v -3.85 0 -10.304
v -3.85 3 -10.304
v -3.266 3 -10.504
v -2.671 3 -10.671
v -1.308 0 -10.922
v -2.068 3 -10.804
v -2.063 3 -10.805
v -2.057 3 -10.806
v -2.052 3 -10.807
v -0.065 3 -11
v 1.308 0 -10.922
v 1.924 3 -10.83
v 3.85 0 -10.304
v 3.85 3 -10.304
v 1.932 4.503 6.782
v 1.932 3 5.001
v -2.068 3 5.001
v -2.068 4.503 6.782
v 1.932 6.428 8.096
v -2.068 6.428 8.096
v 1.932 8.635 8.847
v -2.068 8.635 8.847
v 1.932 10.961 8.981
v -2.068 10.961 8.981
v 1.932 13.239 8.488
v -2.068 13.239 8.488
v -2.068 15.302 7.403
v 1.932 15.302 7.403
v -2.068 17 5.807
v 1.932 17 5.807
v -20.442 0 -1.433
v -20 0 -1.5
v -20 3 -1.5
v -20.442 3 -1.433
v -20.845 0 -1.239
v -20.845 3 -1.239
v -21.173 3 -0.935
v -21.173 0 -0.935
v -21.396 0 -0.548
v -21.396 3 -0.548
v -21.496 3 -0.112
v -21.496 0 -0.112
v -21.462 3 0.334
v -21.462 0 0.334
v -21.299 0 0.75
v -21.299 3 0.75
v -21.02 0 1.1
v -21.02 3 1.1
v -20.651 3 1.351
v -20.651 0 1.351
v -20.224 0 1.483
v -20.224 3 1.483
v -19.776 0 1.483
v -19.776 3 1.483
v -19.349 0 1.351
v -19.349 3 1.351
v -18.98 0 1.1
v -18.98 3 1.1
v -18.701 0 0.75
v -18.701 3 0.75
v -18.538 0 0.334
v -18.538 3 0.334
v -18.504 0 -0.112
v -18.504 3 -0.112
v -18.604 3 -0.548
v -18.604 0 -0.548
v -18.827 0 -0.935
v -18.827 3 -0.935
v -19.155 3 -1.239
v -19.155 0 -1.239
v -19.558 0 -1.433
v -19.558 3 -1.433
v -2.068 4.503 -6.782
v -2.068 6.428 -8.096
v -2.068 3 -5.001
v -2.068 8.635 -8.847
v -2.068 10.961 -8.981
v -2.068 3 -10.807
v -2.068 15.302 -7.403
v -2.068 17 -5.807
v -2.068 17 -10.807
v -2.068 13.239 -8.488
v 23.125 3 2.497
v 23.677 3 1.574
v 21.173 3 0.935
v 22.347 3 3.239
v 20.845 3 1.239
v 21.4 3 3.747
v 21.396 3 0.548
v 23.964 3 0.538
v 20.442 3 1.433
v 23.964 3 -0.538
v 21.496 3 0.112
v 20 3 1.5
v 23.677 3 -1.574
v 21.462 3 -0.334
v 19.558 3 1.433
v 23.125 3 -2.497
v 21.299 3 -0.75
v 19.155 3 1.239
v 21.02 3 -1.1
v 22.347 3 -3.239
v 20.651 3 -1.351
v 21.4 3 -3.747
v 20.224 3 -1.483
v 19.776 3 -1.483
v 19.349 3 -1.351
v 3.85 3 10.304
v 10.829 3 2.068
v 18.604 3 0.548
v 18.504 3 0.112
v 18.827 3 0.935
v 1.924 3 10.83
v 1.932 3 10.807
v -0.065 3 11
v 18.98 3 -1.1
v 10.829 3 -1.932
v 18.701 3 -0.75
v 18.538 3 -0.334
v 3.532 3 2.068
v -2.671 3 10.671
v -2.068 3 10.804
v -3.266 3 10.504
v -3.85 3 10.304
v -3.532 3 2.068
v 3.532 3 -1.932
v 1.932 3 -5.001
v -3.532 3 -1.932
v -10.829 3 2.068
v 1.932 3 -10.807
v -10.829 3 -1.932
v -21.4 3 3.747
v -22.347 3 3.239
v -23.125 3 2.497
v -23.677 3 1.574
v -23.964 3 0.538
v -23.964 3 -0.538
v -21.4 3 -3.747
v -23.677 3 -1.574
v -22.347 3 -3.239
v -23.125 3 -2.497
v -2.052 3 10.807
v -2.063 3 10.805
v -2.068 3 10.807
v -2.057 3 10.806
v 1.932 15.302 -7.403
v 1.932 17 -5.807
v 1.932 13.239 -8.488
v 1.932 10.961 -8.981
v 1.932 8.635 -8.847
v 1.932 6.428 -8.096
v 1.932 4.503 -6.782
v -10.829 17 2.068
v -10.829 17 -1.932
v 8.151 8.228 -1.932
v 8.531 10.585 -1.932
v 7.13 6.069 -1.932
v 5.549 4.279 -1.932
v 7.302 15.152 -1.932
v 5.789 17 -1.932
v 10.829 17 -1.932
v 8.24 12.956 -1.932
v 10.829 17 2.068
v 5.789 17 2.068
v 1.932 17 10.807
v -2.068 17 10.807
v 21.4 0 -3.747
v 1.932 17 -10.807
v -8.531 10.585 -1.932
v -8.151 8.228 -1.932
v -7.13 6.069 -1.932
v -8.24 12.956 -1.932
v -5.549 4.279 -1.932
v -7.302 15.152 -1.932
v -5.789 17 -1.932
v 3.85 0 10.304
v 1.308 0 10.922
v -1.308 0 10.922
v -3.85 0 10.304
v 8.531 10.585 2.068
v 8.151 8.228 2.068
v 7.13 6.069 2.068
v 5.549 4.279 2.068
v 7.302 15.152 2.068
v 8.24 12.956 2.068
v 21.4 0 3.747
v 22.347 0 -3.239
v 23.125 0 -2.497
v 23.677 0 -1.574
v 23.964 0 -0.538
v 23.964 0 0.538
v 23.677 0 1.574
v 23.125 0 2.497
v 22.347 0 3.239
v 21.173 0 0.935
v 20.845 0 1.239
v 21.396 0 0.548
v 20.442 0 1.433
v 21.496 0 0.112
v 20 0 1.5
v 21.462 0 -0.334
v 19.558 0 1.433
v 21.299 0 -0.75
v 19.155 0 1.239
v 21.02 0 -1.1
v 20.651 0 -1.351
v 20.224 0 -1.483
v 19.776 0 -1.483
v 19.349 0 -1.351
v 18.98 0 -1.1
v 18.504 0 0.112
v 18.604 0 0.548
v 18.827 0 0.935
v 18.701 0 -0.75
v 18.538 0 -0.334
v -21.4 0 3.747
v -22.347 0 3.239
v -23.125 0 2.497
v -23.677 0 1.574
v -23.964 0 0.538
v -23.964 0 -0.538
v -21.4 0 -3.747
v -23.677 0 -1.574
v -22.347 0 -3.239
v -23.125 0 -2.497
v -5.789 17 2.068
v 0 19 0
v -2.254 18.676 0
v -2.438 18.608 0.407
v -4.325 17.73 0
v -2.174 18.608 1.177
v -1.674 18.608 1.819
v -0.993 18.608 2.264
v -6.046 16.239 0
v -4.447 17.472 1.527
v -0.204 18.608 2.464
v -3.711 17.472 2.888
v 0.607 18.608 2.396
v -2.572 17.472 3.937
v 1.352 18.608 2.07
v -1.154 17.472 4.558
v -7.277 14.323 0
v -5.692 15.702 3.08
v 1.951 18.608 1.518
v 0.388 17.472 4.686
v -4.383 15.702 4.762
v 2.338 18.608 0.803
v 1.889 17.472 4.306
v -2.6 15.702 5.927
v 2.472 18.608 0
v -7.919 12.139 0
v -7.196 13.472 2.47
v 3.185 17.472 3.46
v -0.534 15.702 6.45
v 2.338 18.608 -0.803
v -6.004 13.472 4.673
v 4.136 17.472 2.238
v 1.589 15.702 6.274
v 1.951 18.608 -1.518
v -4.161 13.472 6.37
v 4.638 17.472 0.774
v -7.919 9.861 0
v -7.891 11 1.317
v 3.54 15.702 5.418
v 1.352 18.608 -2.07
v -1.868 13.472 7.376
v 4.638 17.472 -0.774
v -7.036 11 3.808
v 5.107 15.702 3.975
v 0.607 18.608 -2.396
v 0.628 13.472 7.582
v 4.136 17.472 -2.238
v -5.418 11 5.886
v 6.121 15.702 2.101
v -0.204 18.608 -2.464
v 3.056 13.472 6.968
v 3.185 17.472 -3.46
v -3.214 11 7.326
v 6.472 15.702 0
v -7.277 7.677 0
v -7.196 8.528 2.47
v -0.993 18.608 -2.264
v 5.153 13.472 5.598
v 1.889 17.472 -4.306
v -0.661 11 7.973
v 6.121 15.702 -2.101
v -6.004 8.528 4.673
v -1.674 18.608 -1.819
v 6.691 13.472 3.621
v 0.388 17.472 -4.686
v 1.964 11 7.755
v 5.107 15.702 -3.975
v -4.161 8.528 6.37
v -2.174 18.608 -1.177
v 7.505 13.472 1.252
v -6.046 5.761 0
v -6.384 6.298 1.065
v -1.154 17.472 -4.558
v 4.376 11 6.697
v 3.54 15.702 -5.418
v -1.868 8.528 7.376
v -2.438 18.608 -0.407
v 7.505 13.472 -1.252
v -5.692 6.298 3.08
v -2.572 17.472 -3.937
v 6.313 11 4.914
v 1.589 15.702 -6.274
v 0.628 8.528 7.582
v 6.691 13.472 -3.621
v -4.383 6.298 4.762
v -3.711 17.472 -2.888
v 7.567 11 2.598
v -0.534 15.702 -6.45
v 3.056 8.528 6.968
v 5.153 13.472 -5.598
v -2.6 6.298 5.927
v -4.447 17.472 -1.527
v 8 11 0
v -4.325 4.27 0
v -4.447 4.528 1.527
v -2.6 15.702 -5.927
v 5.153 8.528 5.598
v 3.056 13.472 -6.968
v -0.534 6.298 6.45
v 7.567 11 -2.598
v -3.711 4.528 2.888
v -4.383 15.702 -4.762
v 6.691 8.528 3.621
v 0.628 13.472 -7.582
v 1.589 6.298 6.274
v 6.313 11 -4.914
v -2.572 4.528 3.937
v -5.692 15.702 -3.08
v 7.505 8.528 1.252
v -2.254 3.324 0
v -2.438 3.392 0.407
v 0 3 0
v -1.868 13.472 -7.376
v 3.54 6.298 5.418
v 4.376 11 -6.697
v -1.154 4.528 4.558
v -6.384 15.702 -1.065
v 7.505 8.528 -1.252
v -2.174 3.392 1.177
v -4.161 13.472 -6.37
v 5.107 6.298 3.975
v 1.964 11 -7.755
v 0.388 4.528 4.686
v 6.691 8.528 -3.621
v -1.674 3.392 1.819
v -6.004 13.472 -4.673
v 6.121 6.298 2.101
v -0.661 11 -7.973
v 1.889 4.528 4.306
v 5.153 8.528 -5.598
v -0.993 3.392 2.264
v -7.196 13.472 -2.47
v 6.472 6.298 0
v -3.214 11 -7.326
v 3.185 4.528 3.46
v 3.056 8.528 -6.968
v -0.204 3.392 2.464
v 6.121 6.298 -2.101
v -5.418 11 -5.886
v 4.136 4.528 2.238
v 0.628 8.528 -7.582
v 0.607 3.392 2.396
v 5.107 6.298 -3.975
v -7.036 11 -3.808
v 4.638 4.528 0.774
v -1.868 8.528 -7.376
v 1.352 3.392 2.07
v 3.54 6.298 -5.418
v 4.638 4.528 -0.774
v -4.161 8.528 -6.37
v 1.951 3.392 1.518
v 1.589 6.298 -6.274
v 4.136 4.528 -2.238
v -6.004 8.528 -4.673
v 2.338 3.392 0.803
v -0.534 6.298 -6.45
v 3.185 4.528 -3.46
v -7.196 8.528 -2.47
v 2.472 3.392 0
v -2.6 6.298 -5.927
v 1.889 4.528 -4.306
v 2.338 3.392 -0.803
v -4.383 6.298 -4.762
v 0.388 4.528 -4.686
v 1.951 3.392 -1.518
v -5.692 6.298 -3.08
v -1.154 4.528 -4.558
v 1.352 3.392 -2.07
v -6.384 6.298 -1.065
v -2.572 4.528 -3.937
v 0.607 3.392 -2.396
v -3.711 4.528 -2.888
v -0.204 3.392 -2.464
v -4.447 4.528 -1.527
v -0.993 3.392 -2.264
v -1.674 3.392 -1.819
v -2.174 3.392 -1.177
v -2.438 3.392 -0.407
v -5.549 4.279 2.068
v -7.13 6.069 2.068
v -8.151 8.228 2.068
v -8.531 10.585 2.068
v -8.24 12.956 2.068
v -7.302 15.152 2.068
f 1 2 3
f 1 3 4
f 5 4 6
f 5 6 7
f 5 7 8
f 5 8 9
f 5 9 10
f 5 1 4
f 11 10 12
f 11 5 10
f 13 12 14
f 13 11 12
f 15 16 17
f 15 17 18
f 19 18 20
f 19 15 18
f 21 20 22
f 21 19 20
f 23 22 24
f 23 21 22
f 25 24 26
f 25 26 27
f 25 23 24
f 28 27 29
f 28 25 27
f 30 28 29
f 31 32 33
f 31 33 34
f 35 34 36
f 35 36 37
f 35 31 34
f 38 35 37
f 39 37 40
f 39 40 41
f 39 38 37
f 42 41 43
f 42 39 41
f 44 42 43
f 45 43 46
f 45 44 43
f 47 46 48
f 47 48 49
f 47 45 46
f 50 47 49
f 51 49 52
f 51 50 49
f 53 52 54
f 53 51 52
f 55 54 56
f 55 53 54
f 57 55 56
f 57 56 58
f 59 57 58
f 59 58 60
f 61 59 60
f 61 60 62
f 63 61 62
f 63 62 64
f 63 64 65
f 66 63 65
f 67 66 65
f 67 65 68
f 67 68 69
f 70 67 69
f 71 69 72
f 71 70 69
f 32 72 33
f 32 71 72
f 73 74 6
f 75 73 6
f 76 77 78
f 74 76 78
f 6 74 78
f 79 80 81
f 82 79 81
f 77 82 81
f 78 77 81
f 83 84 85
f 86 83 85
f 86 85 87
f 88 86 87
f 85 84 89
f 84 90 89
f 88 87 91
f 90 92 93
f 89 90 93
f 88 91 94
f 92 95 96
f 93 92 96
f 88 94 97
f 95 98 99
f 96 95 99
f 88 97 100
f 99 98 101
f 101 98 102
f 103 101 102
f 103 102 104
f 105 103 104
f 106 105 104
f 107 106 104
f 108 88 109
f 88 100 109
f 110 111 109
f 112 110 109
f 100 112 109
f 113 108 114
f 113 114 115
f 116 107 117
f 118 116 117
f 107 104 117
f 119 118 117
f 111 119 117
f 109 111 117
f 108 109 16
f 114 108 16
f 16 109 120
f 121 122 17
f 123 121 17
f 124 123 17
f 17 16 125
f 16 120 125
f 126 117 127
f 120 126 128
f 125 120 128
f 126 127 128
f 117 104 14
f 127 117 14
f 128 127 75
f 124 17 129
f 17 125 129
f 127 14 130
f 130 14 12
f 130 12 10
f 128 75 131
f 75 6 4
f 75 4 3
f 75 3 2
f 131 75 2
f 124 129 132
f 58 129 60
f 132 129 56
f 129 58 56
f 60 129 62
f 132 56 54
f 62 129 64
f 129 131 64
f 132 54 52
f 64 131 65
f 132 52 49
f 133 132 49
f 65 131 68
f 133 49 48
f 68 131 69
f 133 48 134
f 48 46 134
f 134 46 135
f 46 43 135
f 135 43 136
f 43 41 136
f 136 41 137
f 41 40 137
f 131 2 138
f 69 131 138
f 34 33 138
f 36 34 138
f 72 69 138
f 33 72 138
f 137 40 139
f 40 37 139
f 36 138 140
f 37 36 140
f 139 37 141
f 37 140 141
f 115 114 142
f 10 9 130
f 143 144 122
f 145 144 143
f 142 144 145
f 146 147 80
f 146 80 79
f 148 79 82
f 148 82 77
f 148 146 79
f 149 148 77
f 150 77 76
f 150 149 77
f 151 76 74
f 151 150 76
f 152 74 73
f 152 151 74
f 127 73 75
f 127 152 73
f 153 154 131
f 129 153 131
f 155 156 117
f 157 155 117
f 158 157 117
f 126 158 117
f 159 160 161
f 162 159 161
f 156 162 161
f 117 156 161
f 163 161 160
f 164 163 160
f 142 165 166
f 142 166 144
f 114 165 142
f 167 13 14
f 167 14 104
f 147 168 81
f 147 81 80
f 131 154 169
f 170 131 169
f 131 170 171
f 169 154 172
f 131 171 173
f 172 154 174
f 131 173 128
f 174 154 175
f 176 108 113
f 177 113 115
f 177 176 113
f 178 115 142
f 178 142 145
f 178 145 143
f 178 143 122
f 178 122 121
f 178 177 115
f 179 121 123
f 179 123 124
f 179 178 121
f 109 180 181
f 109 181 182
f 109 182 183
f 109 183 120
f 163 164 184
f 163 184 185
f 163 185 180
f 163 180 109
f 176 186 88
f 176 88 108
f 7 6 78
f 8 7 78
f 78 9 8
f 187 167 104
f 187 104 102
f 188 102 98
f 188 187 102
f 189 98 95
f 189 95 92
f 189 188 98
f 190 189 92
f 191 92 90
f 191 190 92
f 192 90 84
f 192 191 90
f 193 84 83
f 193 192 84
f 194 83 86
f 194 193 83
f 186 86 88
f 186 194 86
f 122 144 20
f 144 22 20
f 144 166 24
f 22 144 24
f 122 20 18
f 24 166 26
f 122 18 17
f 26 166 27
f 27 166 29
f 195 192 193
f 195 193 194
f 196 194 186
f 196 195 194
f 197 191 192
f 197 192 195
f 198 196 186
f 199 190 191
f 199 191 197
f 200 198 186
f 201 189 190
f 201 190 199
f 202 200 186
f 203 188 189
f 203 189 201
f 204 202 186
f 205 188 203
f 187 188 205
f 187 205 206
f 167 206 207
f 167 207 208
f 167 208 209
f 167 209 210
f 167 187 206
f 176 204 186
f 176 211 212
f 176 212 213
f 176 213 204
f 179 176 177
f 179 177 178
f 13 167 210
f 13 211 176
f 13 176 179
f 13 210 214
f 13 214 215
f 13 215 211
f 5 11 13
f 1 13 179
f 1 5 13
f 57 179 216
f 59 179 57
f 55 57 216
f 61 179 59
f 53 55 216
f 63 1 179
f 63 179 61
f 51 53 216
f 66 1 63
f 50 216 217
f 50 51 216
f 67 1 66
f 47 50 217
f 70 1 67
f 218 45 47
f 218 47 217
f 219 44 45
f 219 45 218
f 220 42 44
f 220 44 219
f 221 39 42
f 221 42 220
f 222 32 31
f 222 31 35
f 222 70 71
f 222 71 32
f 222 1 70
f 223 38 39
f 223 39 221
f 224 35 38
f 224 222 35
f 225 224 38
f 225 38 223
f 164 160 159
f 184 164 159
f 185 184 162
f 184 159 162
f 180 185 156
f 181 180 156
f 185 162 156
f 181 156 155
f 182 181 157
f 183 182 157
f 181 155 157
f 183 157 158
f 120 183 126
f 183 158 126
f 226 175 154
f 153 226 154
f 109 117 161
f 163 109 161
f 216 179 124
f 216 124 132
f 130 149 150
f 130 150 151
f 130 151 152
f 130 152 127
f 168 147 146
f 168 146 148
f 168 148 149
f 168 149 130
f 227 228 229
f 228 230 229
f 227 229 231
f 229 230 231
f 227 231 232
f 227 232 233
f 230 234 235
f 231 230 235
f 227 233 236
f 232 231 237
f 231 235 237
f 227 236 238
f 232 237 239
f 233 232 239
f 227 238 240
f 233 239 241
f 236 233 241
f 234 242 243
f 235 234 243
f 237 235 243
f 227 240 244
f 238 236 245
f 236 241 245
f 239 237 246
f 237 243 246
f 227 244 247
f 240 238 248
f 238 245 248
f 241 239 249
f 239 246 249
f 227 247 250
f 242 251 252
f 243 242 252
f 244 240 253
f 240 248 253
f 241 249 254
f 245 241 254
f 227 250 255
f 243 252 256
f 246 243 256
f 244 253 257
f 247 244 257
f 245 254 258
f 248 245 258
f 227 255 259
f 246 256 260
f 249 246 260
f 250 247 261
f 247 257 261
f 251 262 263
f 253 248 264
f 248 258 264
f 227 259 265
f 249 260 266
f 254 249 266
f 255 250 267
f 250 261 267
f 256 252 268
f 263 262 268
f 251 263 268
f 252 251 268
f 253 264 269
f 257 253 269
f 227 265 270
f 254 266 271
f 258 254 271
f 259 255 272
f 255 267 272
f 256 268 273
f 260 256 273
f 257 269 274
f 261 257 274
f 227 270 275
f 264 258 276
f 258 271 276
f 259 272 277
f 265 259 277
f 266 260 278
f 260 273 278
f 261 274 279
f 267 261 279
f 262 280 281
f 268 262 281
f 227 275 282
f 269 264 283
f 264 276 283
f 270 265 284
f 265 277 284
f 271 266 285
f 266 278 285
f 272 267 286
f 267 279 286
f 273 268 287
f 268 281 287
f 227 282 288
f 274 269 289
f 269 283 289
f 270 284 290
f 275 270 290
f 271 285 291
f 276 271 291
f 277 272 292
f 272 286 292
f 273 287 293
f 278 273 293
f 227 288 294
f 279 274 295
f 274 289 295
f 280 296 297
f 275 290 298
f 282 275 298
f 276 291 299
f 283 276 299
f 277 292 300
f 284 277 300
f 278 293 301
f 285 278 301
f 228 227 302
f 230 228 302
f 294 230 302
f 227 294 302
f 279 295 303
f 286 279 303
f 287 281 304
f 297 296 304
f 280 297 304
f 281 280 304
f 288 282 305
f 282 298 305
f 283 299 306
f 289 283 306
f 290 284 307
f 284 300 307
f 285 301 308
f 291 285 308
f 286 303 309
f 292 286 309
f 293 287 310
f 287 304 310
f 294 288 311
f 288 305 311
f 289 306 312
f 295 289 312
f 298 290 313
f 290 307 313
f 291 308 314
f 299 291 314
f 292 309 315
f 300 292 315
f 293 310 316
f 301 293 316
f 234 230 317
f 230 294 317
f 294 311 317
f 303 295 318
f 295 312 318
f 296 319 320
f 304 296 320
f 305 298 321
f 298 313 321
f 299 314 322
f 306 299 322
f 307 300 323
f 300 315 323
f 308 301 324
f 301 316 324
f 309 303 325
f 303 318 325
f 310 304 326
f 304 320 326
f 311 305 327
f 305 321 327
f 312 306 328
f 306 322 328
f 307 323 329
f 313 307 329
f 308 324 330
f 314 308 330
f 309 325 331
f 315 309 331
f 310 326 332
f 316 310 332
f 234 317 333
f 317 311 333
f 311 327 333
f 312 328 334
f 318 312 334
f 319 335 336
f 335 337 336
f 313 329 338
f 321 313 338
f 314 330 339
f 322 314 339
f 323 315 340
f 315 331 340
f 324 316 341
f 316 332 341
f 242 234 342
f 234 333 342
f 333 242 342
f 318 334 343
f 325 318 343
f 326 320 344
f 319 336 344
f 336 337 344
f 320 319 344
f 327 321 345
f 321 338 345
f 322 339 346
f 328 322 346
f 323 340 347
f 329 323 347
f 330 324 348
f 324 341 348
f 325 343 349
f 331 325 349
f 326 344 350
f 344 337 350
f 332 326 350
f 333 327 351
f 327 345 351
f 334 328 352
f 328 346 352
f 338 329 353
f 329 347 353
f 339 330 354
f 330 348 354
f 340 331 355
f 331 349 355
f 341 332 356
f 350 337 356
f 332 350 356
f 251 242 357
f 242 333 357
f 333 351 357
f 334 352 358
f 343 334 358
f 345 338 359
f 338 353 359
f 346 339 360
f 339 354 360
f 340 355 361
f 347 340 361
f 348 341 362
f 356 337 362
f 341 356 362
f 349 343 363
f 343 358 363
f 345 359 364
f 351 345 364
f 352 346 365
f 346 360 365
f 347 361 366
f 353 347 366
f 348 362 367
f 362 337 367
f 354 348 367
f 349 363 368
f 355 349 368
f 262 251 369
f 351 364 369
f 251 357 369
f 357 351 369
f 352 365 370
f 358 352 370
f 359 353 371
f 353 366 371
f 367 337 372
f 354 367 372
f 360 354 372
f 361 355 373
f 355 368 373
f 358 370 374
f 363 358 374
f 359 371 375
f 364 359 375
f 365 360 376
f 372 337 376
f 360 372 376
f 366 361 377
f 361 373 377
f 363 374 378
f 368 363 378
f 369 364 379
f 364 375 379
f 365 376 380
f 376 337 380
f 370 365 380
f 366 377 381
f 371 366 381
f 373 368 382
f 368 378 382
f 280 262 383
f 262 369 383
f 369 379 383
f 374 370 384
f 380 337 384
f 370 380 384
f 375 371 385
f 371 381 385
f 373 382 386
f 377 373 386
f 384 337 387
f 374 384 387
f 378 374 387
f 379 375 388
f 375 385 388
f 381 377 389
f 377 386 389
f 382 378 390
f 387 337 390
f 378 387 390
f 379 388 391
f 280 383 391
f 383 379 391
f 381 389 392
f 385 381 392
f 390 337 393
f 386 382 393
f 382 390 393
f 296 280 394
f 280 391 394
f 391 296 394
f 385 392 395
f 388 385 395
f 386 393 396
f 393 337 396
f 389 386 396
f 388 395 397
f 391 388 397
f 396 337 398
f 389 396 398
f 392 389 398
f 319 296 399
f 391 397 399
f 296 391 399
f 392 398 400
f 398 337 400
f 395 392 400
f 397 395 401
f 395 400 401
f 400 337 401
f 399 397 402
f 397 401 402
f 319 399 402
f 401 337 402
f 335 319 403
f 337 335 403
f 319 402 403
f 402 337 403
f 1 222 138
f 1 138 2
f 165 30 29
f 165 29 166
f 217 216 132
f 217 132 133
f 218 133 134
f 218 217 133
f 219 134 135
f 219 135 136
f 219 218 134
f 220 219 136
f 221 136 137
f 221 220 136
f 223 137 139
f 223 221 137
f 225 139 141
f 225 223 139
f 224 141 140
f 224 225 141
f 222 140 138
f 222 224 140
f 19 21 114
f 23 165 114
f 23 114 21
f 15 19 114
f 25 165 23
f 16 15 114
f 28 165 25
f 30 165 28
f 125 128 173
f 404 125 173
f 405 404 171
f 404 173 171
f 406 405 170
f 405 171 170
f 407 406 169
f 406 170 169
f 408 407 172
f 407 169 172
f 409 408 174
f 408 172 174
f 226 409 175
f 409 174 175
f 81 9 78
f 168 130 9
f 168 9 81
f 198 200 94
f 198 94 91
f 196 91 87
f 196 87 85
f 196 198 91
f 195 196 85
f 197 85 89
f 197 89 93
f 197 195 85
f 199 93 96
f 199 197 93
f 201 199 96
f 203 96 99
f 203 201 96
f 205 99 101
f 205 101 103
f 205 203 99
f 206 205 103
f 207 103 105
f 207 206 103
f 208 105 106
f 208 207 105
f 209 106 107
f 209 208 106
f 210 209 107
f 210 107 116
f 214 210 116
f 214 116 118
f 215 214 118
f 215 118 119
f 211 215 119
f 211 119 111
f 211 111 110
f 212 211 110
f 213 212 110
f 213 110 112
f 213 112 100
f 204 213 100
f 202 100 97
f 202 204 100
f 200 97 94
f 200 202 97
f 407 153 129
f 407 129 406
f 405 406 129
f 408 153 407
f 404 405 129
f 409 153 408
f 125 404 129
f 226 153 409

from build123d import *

# Parameters (mm, degrees)
CROQUIS1_R              = 1.5
SALIENTE_EXTRUIR1_DEPTH = 3
SALIENTE_EXTRUIR2_DEPTH = 4
SALIENTE_EXTRUIR3_DEPTH = 4


with BuildPart() as part:
    # Croquis1 → Saliente-Extruir1 (new body)
    with BuildSketch(Plane(origin=(0, 0, 0), x_dir=(1, 0, 0), z_dir=(0, 1, 0))):
        with BuildLine():
            Line((3.85, 10.304246697), (21.4, 3.746998799))
            ThreePointArc((21.4, 3.746998799), (24, 0), (21.4, -3.746998799))
            Line((21.4, -3.746998799), (3.85, -10.304246697))
            ThreePointArc((3.85, -10.304246697), (0, -11), (-3.85, -10.304246697))
            Line((-3.85, -10.304246697), (-21.4, -3.746998799))
            ThreePointArc((-21.4, -3.746998799), (-24, 0), (-21.4, 3.746998799))
            Line((-21.4, 3.746998799), (-3.85, 10.304246697))
            ThreePointArc((-3.85, 10.304246697), (0, 11), (3.85, 10.304246697))
        make_face()
        with Locations(Location((20, 0, 0), (0, 0, 270))):
            Circle(CROQUIS1_R, mode=Mode.SUBTRACT)
        with Locations(Location((-20, 0, 0), (0, 0, 90))):
            Circle(CROQUIS1_R, mode=Mode.SUBTRACT)
    extrude(amount=SALIENTE_EXTRUIR1_DEPTH)

    # Croquis3D1 → Saliente-Extruir2 (add)
    with BuildSketch(Plane(origin=(1.93230371, 3, -10.806862588), x_dir=(0, 0.5436521731456766, 0.8393106186829661), z_dir=(-1, 0, 0))):
        with BuildLine():
            Line((0, 0), (7.611130424, 11.750348662))
            Line((7.611130424, 11.750348662), (11.807683517, 9.032087796))
            ThreePointArc((11.807683517, 9.032087796), (5.215820101, 4.715586782), (4.872876352, -3.156340167))
            Line((4.872876352, -3.156340167), (0, 0))
        make_face()
        with BuildLine():
            Line((18.140629049, -11.750348662), (13.267752697, -8.594008495))
            ThreePointArc((13.267752697, -8.594008495), (20.311339254, -5.06233287), (21.55520638, 2.718260866))
            Line((21.55520638, 2.718260866), (25.751759473, 0))
            Line((25.751759473, 0), (18.140629049, -11.750348662))
        make_face()
    extrude(amount=SALIENTE_EXTRUIR2_DEPTH)

    # Croquis3D2 → Saliente-Extruir3 (add)
    with BuildSketch(Plane(origin=(10.828952044, 3, -1.93230371), x_dir=(-0.8398165749256806, 0.5428702611859474, 0), z_dir=(0, 0, -1))):
        with BuildLine():
            Line((0, 0), (7.600183657, 11.757432049))
            Line((7.600183657, 11.757432049), (11.832617517, 9.021522156))
            ThreePointArc((11.832617517, 9.021522156), (5.490362337, 4.063536139), (6.128199812, -3.961361959))
            Line((6.128199812, -3.961361959), (0, 0))
        make_face()
        with BuildLine():
            Line((18.188666831, -11.757432049), (12.060467019, -7.79607009))
            ThreePointArc((12.060467019, -7.79607009), (19.639638477, -5.082772071), (21.556416627, 2.735909893))
            Line((21.556416627, 2.735909893), (25.788850488, 0))
            Line((25.788850488, 0), (18.188666831, -11.757432049))
        make_face()
    extrude(amount=-SALIENTE_EXTRUIR3_DEPTH)


with BuildPart() as body_2:
    # Croquis3 → Revolución1 (revolve)
    with BuildSketch(Plane.XY):
        with BuildLine():
            Line((0, 3), (0, 19))
            ThreePointArc((0, 19), (-8, 11), (0, 3))
        make_face()
    revolve(axis=Axis((0, 3, 0), (0, 1, 0)))


solid = Compound([part.part, body_2.part])
